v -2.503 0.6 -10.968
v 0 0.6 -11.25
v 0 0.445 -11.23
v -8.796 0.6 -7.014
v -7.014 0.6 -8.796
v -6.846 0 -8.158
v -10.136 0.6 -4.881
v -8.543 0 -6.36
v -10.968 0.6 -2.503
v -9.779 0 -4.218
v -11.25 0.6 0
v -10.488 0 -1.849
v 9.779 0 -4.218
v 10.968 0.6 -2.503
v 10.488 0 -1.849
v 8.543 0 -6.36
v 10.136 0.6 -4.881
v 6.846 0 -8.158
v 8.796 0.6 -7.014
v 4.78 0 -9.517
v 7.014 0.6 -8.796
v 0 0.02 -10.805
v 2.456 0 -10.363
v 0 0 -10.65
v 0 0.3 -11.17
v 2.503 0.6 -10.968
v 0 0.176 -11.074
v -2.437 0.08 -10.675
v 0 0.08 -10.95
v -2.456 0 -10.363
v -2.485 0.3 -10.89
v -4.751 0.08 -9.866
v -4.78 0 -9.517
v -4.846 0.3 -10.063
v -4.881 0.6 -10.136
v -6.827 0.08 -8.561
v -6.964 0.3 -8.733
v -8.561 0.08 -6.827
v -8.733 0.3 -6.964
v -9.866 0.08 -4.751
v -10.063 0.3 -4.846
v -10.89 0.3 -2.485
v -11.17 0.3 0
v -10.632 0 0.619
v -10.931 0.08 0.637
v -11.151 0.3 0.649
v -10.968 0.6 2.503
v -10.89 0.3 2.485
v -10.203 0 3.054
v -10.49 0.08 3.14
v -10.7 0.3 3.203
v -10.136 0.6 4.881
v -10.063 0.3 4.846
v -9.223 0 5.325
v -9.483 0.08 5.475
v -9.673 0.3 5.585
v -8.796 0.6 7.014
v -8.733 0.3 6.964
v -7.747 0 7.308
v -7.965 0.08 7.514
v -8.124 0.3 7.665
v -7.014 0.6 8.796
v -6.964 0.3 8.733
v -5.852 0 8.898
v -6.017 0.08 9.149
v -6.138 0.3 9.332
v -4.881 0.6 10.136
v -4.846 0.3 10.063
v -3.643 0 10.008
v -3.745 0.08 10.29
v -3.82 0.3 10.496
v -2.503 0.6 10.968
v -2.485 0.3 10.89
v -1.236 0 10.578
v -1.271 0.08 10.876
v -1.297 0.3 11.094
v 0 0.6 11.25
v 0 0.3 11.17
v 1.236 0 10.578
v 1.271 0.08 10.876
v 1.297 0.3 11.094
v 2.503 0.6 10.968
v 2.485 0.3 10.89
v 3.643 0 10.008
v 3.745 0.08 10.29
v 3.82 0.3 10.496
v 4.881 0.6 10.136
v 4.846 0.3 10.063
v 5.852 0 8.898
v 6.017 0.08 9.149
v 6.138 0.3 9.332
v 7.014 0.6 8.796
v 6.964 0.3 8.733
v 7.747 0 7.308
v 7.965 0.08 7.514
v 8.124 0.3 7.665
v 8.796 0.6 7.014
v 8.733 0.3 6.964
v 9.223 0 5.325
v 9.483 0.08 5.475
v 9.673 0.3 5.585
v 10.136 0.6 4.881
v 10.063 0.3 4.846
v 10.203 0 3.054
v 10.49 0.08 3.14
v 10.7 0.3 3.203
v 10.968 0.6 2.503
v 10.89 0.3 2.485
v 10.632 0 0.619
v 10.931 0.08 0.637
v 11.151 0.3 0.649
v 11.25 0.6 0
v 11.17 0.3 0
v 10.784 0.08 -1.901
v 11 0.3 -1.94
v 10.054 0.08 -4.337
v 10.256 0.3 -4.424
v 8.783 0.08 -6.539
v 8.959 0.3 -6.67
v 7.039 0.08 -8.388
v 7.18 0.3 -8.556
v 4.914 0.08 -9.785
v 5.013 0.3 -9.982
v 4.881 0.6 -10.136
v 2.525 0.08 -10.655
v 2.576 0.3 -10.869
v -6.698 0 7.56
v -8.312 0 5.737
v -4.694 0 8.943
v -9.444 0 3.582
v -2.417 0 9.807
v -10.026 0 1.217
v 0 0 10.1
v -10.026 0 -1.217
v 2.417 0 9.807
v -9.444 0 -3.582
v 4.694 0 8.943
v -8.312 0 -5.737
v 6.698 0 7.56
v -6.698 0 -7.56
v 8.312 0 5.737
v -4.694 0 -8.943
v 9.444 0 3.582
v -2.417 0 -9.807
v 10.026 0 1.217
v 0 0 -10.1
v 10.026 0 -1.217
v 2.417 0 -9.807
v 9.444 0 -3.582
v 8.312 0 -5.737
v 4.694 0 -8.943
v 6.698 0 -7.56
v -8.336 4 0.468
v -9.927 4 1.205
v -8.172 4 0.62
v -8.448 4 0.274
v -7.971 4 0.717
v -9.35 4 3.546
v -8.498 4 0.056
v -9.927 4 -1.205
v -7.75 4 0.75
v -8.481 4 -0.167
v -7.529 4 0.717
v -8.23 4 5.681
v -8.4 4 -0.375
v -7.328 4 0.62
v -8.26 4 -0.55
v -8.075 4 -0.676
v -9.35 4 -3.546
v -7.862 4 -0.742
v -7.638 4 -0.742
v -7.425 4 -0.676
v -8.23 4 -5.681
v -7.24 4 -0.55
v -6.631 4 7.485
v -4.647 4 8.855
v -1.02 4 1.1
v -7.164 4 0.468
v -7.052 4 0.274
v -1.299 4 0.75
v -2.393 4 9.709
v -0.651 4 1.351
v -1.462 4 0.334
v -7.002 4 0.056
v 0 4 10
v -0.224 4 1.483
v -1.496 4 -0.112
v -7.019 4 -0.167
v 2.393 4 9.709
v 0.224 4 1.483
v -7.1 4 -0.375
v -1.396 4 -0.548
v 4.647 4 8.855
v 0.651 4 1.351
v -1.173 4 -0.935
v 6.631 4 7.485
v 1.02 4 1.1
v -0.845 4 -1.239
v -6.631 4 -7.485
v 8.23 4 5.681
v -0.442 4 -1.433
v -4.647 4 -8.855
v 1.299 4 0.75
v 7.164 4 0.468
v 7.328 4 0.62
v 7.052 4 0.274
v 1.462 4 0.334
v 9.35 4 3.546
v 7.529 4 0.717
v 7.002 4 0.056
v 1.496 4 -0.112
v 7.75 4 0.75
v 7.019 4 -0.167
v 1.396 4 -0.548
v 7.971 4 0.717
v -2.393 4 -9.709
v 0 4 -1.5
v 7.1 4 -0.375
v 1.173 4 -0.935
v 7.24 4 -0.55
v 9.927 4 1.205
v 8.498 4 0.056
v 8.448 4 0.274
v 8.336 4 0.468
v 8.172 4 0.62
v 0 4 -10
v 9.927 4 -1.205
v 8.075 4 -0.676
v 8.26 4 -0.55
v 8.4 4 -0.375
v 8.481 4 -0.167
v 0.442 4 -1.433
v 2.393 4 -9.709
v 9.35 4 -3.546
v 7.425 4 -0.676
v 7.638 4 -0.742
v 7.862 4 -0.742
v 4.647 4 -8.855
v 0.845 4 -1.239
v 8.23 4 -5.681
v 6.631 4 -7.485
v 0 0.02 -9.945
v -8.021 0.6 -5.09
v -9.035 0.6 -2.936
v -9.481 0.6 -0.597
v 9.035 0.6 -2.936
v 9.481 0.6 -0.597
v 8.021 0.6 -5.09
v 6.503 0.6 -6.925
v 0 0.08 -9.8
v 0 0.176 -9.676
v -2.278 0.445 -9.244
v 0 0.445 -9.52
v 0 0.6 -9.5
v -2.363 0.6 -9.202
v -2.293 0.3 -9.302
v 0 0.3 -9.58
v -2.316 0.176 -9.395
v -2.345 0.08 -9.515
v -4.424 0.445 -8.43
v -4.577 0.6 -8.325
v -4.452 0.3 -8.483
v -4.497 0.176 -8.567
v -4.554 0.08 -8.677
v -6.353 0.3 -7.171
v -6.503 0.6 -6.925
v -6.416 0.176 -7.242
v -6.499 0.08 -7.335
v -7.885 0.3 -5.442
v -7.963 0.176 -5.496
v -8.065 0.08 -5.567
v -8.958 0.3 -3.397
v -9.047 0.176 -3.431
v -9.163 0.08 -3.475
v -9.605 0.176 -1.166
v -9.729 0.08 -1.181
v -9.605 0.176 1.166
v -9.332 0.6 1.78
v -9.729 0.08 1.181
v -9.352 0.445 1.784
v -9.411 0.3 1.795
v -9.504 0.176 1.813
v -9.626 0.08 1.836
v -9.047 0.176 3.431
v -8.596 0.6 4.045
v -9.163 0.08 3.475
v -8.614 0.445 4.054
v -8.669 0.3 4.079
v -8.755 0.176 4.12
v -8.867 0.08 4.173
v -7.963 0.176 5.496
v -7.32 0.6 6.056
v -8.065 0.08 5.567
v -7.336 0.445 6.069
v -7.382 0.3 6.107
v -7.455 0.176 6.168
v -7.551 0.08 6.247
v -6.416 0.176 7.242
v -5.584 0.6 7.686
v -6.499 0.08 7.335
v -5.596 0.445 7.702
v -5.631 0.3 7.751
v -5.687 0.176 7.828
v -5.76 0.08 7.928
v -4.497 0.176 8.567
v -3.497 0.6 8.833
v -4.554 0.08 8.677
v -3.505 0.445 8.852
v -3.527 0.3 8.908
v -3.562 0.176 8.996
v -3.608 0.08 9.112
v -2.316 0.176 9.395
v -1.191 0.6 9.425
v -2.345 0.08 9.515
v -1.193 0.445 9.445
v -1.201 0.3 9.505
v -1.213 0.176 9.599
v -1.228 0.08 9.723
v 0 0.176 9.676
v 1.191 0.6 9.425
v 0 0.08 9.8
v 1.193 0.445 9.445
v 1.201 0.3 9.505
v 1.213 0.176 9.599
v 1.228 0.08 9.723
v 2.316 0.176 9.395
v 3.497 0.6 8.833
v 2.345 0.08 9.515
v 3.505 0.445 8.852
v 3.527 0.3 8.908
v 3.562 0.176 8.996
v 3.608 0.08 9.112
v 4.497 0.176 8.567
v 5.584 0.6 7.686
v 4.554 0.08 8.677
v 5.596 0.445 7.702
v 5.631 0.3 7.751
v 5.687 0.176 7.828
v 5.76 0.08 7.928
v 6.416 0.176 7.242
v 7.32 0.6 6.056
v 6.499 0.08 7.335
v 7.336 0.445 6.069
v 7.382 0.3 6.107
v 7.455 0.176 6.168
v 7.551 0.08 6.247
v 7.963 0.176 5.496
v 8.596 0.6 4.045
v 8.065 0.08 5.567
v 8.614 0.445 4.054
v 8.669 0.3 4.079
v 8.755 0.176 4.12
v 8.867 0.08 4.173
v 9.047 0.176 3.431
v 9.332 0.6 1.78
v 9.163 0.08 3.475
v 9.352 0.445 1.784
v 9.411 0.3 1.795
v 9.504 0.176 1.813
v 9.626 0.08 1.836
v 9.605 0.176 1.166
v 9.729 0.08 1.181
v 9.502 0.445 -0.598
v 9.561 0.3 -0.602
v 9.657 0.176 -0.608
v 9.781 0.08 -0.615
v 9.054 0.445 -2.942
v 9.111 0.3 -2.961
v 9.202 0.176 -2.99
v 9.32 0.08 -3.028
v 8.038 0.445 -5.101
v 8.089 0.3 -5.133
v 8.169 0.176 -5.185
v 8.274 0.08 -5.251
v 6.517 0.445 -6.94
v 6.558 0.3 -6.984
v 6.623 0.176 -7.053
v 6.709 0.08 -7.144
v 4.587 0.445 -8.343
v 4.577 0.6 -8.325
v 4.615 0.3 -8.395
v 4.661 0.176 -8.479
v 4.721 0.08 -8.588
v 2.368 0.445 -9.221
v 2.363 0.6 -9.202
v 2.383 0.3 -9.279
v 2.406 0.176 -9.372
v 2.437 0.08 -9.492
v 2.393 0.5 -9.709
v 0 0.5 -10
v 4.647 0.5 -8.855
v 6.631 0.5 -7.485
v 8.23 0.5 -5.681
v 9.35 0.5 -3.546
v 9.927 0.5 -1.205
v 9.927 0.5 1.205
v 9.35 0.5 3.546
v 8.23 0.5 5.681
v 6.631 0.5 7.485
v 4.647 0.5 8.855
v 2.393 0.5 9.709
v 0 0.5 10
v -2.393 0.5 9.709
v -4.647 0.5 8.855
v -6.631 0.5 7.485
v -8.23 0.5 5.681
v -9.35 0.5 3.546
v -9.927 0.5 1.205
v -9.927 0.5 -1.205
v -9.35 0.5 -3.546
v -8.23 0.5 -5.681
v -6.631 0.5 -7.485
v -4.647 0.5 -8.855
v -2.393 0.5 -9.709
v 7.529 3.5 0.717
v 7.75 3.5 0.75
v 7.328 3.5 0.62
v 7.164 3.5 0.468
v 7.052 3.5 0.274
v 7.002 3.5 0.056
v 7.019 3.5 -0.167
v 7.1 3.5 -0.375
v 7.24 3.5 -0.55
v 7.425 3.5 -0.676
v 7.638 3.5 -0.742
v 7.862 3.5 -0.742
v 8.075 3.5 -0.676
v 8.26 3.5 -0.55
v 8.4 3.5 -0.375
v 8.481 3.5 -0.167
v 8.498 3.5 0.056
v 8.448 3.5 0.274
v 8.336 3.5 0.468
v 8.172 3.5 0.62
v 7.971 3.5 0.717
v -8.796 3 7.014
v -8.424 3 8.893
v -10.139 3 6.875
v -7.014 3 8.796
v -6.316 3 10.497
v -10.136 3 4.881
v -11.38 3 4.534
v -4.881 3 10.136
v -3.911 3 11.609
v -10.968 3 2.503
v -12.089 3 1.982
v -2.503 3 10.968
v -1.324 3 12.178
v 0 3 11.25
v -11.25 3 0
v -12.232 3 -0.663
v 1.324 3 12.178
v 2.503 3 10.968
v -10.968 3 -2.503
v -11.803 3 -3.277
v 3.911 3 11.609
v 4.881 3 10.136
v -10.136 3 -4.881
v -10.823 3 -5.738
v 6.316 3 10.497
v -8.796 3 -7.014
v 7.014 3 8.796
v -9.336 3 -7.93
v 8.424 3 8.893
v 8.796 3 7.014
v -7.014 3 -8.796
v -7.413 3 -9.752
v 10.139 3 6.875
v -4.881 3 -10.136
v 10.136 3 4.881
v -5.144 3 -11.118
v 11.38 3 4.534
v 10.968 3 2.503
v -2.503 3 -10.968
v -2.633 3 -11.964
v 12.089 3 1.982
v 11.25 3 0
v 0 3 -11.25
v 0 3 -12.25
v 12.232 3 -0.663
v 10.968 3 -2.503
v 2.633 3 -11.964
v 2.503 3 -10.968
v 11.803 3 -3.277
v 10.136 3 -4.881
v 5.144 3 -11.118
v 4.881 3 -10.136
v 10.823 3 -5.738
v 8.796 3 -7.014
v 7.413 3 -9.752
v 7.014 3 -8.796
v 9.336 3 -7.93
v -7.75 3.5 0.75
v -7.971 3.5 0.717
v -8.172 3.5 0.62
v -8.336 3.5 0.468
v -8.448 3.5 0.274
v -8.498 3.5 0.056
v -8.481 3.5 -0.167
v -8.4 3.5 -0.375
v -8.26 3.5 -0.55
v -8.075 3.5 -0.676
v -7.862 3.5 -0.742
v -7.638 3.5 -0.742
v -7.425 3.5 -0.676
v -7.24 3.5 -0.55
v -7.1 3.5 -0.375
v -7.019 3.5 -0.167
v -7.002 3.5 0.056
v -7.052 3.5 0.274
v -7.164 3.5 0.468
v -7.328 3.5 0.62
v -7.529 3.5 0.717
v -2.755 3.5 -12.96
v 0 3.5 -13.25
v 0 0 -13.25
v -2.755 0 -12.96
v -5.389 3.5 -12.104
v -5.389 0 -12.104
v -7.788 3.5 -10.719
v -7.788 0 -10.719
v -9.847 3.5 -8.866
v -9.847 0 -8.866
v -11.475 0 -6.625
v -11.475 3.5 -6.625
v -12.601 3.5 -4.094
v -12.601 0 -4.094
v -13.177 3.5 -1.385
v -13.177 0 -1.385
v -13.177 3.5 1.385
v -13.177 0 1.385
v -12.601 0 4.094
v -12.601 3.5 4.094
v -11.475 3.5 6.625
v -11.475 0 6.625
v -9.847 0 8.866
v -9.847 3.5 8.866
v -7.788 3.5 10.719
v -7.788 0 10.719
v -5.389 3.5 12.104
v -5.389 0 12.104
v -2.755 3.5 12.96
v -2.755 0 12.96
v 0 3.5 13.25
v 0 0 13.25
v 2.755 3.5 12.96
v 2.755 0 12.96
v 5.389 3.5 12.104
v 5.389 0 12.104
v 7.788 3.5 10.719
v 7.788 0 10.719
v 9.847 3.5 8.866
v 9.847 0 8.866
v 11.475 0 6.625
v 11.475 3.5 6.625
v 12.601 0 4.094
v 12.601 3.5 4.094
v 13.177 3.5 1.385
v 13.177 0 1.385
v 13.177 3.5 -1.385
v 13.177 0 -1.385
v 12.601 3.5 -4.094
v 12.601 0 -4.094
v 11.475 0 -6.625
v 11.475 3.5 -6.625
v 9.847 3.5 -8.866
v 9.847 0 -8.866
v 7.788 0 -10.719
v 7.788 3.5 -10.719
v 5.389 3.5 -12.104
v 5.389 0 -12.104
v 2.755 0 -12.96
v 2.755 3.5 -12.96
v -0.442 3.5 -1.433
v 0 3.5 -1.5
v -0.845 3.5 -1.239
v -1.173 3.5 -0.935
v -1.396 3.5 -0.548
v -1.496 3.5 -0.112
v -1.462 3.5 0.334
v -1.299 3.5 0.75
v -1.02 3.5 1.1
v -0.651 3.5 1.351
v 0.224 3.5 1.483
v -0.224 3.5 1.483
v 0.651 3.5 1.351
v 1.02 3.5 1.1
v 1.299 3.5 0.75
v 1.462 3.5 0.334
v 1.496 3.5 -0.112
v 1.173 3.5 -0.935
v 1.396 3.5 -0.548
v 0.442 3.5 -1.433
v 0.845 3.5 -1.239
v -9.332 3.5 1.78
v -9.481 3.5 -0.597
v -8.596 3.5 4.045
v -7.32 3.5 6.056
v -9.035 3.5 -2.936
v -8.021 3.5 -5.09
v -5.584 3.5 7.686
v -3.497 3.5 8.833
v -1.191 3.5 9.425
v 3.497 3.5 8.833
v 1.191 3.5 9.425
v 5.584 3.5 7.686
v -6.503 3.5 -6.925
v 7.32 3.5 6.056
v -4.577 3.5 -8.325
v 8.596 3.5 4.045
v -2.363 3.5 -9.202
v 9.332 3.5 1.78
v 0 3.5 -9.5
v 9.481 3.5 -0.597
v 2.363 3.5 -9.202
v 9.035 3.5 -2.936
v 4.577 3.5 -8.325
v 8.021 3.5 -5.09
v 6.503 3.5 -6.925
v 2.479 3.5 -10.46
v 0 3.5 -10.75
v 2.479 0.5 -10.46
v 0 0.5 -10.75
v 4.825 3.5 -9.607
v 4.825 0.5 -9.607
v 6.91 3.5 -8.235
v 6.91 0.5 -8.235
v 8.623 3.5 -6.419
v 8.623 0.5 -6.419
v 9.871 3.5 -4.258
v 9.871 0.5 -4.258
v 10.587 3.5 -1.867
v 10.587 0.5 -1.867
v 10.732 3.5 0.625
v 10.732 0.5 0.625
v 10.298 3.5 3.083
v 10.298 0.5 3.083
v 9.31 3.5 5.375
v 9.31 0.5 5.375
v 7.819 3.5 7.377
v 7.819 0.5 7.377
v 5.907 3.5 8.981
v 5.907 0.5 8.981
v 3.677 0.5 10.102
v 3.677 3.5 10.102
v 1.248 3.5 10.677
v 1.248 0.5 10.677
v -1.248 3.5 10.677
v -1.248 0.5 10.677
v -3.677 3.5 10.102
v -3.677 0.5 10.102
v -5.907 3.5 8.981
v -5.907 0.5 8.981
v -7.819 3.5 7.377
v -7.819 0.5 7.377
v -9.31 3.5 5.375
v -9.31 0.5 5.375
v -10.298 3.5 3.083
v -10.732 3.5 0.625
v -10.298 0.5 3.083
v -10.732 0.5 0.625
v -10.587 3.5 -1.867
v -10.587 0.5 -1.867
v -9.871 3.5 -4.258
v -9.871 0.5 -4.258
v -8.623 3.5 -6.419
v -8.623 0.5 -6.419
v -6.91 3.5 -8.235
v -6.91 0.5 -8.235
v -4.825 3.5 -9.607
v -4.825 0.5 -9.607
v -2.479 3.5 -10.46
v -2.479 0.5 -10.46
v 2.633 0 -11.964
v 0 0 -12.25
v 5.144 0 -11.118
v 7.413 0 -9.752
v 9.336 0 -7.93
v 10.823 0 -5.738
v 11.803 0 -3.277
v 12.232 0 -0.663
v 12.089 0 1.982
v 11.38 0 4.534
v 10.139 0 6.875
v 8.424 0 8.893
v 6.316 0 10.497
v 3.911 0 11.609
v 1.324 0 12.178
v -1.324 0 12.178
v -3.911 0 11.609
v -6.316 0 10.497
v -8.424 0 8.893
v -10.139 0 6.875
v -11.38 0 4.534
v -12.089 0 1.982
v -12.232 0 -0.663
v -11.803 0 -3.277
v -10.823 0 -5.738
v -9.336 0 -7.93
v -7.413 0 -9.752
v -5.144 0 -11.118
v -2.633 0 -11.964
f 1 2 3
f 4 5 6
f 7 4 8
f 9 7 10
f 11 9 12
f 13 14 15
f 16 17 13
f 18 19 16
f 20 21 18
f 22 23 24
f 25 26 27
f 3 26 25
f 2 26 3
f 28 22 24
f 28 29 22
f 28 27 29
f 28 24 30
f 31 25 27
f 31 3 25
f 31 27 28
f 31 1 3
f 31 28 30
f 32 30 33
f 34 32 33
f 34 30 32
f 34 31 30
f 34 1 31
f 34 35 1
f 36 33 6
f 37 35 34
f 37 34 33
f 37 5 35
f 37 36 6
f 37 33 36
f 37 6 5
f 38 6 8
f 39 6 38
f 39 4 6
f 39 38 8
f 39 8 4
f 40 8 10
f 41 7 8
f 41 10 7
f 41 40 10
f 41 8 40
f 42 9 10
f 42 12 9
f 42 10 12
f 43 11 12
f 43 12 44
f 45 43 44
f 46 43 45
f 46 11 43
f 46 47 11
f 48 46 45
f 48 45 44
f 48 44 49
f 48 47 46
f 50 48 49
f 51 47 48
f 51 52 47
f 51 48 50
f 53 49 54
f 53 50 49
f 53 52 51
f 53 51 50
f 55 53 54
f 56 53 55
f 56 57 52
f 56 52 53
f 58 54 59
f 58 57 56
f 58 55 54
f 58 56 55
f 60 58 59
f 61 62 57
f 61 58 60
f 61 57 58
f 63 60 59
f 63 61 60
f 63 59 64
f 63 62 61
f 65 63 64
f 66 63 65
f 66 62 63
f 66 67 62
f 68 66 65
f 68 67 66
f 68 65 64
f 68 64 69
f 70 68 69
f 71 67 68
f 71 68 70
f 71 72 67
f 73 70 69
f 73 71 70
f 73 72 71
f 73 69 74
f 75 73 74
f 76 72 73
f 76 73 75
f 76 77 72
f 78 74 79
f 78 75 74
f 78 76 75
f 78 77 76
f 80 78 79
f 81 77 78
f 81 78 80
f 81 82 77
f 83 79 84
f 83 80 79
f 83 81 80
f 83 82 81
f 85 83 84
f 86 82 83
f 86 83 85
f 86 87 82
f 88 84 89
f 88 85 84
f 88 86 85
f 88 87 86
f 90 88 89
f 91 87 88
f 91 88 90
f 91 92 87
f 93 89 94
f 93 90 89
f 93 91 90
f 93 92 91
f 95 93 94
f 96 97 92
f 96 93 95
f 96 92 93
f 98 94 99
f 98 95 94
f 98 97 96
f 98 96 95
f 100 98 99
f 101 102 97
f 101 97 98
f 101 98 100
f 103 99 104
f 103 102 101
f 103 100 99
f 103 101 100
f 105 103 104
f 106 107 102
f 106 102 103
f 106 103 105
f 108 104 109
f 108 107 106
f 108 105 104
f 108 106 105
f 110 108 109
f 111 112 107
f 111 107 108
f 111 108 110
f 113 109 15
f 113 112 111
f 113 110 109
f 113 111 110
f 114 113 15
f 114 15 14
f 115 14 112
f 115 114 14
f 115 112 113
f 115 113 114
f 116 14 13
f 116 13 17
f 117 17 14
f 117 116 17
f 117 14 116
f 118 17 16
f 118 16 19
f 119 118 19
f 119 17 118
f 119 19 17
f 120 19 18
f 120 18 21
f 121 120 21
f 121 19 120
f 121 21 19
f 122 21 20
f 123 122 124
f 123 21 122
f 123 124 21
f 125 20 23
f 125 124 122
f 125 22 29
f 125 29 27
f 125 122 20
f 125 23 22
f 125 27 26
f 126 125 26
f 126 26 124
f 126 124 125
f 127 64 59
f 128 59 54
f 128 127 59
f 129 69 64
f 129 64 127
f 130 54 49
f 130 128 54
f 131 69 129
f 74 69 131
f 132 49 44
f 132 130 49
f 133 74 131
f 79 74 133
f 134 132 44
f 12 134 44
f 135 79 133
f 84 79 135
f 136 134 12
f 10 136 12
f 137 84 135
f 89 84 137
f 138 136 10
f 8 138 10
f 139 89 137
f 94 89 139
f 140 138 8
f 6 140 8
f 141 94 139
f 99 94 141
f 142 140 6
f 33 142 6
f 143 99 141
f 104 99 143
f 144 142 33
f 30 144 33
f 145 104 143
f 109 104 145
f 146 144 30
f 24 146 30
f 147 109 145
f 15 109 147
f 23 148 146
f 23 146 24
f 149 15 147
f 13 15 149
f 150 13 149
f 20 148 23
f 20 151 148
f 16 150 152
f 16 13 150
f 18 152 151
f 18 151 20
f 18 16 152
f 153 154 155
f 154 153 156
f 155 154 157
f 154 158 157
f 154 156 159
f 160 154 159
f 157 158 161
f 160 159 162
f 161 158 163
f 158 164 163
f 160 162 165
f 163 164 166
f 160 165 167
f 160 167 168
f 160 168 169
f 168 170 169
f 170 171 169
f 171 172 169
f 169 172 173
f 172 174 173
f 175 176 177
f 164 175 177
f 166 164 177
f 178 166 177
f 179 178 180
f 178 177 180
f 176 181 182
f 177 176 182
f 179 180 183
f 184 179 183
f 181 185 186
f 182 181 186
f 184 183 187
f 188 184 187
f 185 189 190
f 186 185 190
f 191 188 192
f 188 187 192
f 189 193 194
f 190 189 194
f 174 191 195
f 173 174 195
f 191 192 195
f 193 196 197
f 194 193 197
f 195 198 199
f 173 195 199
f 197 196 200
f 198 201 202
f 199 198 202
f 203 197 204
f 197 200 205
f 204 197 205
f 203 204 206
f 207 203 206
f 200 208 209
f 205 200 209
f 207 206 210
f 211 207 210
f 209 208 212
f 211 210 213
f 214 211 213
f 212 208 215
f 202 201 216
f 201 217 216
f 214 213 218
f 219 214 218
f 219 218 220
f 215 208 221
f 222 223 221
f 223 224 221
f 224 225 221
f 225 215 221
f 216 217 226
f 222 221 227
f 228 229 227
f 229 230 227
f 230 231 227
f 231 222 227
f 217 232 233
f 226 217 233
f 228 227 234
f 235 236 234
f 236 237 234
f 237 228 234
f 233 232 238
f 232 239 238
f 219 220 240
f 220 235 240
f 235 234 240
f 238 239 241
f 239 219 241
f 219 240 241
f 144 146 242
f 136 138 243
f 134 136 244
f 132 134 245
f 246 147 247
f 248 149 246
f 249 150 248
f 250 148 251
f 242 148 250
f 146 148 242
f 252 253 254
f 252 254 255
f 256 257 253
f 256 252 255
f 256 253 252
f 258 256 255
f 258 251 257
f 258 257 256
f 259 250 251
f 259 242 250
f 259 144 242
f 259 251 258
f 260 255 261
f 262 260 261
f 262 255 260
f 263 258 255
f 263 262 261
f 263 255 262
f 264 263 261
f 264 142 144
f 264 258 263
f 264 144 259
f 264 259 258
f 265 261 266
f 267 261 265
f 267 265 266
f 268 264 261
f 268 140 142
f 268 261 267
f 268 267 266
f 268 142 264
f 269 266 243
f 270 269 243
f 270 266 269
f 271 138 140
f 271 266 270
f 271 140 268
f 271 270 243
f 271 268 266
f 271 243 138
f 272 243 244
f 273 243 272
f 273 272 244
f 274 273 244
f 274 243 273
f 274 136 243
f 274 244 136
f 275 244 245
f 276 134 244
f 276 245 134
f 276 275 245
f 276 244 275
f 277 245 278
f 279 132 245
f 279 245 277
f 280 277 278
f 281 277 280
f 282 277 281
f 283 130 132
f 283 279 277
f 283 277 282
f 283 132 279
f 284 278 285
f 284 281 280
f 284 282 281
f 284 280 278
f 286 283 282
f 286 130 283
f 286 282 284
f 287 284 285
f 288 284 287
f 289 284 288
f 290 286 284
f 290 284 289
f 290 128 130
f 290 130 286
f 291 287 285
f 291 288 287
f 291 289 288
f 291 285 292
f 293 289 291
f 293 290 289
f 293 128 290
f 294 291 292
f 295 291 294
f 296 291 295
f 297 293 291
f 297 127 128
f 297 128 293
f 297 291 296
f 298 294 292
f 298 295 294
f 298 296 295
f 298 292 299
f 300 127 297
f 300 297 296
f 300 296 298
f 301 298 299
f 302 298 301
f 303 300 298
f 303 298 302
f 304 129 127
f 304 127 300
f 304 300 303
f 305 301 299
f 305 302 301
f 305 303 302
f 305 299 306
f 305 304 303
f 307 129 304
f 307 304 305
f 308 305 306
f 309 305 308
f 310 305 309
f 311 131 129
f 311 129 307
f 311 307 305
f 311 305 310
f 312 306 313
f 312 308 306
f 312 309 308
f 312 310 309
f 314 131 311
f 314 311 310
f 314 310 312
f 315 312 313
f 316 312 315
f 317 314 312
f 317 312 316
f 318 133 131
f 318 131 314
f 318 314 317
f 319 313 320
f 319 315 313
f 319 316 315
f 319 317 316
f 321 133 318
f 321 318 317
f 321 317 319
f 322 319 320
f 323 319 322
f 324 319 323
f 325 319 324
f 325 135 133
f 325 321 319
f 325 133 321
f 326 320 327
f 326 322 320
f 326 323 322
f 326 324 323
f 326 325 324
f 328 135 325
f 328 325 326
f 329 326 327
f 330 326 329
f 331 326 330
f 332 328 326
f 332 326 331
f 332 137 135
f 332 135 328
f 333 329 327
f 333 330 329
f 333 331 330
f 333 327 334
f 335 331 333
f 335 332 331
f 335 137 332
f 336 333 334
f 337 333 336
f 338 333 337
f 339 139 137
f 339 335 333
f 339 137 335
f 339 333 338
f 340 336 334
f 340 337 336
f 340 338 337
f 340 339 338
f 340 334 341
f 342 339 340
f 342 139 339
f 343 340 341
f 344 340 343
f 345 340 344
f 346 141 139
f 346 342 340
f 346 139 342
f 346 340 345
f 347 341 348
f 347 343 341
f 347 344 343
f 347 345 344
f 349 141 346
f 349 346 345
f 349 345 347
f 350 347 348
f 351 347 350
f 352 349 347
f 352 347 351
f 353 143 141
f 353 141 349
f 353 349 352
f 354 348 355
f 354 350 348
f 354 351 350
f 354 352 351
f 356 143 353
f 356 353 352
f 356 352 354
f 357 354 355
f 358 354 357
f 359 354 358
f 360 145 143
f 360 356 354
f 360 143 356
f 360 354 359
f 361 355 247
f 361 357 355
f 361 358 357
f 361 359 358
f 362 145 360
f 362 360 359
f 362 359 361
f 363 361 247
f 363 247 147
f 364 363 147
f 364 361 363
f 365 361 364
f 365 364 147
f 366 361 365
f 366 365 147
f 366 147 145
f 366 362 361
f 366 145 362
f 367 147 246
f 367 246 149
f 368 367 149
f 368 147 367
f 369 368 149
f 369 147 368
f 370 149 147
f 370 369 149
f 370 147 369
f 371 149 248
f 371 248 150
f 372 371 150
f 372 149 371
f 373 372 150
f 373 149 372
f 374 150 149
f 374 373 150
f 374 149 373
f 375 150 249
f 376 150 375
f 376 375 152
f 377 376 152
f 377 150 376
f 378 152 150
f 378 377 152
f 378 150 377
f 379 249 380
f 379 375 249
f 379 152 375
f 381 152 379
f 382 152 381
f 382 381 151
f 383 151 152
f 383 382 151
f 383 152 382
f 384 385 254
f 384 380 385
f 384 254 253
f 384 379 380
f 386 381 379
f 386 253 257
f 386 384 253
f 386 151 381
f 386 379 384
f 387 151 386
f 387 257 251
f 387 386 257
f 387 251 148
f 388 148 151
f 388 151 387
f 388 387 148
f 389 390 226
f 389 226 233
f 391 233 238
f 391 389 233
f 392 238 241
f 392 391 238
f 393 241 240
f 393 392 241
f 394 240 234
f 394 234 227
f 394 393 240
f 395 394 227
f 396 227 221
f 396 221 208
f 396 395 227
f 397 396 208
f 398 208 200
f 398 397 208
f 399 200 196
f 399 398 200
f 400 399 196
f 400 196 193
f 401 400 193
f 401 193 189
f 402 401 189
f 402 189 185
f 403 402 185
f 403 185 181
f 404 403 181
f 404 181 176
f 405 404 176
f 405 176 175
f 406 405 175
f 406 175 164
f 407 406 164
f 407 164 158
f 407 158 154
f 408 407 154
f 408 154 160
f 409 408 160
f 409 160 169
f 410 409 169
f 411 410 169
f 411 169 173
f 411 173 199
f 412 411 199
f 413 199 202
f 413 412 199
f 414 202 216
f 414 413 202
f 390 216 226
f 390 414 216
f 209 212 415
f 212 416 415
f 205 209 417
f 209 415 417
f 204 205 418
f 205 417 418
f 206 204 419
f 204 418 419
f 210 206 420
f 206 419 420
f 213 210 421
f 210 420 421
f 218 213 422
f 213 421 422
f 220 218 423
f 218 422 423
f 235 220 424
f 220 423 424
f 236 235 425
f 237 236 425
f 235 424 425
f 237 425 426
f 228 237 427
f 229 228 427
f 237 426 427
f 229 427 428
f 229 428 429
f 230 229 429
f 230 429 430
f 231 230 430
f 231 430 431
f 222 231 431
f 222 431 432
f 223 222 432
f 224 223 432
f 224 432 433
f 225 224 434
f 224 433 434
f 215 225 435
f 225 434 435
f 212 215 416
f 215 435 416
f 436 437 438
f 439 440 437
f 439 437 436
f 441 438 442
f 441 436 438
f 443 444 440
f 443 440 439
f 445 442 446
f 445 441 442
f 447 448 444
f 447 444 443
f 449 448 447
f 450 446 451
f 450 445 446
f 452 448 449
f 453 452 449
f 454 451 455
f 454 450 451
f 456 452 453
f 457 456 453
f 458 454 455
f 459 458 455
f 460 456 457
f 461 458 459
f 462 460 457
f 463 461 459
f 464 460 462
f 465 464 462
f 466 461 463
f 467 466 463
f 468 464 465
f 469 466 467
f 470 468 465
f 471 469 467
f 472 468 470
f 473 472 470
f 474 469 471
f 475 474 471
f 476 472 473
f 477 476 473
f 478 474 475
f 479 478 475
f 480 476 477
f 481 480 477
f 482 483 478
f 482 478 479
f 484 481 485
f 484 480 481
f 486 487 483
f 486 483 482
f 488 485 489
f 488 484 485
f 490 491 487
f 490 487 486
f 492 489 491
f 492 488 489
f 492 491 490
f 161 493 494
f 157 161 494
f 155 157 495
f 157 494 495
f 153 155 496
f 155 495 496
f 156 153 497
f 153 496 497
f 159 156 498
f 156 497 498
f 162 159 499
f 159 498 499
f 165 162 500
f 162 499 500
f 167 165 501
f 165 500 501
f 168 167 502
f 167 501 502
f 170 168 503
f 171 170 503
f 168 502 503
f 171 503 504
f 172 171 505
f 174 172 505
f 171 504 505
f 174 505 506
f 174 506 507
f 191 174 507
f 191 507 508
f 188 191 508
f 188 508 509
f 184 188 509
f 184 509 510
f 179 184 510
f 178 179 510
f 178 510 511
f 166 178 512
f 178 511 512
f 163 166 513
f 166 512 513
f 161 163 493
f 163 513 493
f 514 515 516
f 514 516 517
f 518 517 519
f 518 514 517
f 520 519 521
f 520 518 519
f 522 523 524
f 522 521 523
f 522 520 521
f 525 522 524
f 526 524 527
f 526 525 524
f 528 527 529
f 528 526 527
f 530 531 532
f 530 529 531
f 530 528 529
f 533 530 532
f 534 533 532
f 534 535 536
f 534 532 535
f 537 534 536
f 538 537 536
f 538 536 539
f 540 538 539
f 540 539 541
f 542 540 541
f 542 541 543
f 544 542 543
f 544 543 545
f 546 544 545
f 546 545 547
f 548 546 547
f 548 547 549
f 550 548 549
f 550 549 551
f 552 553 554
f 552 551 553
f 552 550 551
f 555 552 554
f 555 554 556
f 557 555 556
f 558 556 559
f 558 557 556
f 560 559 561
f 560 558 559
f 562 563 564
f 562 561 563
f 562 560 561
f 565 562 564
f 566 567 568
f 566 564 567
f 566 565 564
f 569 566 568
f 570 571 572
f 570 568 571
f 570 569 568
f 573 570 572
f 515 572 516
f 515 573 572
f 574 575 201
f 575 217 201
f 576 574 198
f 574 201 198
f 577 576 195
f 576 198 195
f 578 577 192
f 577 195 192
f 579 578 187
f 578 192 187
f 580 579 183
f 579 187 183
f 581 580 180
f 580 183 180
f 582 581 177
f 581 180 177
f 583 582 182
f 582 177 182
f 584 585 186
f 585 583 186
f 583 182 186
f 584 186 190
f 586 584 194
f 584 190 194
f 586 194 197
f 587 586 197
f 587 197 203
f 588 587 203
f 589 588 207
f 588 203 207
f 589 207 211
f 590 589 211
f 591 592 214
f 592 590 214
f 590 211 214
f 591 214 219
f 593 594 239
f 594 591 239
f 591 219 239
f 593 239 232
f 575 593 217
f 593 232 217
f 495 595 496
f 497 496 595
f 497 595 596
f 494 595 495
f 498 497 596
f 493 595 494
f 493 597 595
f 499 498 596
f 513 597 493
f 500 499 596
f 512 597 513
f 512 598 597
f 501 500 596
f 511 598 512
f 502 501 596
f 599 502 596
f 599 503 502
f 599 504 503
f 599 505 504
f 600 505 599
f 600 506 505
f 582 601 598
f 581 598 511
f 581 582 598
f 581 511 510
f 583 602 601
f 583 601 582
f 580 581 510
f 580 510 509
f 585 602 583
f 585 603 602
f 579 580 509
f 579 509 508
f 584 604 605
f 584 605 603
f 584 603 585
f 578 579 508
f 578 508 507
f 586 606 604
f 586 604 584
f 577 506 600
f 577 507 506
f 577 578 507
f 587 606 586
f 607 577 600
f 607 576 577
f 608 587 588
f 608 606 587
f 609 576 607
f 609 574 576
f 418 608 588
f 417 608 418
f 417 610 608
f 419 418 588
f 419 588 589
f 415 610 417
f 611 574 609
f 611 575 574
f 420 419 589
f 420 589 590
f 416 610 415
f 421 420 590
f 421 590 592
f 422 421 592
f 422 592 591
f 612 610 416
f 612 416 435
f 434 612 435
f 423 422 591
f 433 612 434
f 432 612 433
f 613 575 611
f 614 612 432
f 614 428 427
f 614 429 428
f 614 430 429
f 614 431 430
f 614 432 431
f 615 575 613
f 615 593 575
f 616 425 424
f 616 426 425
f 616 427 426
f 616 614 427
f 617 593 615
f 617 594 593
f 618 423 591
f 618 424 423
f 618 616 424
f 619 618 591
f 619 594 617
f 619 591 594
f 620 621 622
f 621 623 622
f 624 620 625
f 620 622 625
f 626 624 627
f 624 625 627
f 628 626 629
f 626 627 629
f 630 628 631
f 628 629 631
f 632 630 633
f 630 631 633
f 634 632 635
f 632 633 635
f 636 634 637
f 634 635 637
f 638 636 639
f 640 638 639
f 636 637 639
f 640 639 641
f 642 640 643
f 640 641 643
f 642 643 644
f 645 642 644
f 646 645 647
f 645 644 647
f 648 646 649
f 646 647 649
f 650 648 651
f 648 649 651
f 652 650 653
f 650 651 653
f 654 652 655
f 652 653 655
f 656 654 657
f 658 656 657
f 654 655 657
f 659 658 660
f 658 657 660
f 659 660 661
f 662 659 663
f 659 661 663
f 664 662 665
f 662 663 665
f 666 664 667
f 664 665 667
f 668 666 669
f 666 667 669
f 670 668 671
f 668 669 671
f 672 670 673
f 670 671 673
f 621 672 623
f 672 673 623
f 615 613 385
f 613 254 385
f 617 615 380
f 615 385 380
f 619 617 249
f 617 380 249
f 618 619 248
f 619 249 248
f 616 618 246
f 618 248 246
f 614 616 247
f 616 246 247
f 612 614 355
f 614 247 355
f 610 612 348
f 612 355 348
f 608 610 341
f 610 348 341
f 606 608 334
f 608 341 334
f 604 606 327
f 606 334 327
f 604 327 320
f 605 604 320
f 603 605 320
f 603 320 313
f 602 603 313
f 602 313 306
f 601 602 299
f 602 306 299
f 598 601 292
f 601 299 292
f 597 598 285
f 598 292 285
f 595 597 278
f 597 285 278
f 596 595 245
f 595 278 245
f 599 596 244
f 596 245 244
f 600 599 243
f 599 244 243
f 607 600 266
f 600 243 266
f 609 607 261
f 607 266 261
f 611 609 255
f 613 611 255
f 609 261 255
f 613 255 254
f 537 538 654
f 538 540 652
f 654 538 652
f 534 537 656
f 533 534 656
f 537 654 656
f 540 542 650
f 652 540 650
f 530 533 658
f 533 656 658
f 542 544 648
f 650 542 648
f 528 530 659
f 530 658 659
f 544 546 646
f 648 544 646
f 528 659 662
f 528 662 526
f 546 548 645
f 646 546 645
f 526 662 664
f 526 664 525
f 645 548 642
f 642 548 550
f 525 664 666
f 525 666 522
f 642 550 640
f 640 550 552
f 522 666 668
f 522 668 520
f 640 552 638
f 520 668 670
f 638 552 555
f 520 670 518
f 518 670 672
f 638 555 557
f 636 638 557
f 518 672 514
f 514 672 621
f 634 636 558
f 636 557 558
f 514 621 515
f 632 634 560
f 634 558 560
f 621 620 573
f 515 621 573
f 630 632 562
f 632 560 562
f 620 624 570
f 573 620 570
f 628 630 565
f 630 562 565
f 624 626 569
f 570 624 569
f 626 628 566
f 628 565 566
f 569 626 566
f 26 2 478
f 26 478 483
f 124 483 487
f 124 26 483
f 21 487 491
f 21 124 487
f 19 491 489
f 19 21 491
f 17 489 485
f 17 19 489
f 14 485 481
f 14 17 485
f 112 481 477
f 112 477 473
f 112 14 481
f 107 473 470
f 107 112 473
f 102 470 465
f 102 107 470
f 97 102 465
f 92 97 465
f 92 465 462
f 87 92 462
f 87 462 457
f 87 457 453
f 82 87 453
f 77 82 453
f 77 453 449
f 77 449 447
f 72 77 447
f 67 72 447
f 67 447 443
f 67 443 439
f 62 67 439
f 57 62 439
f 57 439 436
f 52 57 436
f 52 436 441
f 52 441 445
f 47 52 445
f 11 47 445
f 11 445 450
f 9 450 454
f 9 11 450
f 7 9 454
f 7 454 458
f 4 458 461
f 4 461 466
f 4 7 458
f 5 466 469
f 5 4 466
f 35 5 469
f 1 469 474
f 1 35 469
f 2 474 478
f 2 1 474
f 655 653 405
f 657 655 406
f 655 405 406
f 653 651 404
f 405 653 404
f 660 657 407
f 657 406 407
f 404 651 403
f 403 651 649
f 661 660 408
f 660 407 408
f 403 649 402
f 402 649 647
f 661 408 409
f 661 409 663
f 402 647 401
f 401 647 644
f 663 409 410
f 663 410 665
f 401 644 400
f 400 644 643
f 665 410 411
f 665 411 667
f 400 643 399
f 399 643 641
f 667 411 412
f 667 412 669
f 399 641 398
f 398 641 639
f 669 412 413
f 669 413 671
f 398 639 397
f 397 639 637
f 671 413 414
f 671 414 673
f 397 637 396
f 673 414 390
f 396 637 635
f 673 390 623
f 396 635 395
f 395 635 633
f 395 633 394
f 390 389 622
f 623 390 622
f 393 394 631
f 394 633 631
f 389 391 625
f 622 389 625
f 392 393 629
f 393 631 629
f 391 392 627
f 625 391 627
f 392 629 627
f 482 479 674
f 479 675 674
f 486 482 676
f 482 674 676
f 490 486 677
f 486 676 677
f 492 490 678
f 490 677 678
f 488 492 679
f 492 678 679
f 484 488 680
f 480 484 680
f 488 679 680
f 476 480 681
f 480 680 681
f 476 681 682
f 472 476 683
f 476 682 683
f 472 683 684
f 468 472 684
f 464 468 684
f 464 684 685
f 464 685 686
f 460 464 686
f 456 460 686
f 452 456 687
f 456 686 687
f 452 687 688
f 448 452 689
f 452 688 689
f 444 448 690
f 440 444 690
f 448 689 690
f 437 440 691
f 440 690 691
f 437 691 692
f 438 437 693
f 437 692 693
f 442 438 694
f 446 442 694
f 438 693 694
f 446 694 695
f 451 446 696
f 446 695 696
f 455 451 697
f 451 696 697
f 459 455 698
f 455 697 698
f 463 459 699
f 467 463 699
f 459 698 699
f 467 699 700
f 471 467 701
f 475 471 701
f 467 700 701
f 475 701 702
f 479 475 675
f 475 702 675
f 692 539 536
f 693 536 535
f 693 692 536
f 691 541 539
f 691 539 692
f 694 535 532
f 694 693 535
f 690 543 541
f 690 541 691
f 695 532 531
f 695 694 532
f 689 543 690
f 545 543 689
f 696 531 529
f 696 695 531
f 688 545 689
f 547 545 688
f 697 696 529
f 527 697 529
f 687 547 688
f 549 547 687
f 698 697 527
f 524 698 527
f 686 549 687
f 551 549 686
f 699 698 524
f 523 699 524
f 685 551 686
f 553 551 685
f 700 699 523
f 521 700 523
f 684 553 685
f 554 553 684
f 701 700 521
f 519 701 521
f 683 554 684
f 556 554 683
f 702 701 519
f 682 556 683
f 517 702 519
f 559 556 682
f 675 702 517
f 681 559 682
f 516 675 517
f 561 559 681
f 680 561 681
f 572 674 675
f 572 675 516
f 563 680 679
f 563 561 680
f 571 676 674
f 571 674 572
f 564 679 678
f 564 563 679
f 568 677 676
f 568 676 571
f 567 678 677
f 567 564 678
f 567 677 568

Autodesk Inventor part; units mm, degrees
ref_plane "YZ Plane" through (0, 0, 0) normal (1, 0, 0) x (0, 1, 0)
ref_plane "XZ Plane" through (0, 0, 0) normal (0, 1, 0) x (-1, 0, 0)
ref_plane "XY Plane" through (0, 0, 0) normal (0, 0, 1) x (1, 0, 0)
sketch "Sketch1" plane through (0, 0, 0) normal (1, 0, 0) x (0, 1, 0)
  line L0 (0, 0) -> (-4.0897, 0)
  line L1 (0, -1.6442) -> (0, -13.25)
  line L2 (0, -13.25) -> (3.5, -13.25)
  line L3 (3.5, -13.25) -> (3.5, -10.75)
  line L4 (3.5, -10.75) -> (0.5, -10.75)
  line L5 (4, 0) -> (4, -10)
  line L6 (4, -10) -> (0.5, -10)
  line L7 (0.5, -10) -> (0.5, -10.75)
  line L8 (3.5, -1.5) -> (3.5, -9.5)
  line L9 (3.5, -9.5) -> (0, -9.5)
  line L10 (3, -11.25) -> (0, -11.25)
  line L11 (3, -11.25) -> (3, -12.25)
  line L12 (3, -12.25) -> (0, -12.25)
  line L13 (3.5, -1.5) -> (4, -1.5)
  point P0 (1.5, -12.25)
  point P1 (3.75, -1.5)
  dimension "d1" = 26.5
  dimension "d2" = 2.5
  dimension "d3" = 3.5
  dimension "d4" = 0
  dimension "d5" = 4
  dimension "d6" = 20
  dimension "d7" = 0.5
  dimension "d8" = 0.5
  dimension "d9" = 0.5
  dimension "d10" = 0.5
  dimension "d11" = 0.5
  dimension "d12" = 1
  dimension "d13" = 3
revolve "Revolution1" add sketch "Sketch1" angle 360 about axis through (0, 0, 0) along (0, -1, 0) contours L9 L8 L13 L5 L6 L7 L4 L3 L2 L1 L12 L11 L10
sketch "Sketch2" plane through (0, 4, 0) normal (0, 1, 0) x (1, 0, 0)
  line L0 (-7.75, 0) -> (7.75, 0)
  point P0 (0, 0)
  point P1 (0, 0)
  dimension "d15" = 15.5
hole "Hole1" at (-7.75, 4, 0) at (7.75, 4, 0) direction (0, -1, 0) diameter 1.5 end through all
fillet "Fillet1" radius 0.6 2 edges at (0, 0, 11.25) (0, 0, 9.5)
equation "\"d8\" = d7"
equation "\"d9\" = d7"
equation "\"d10\" = d7"
equation "\"d11\" = d7"
properties part number "Diaphram" material "Rubber, Silicone"
